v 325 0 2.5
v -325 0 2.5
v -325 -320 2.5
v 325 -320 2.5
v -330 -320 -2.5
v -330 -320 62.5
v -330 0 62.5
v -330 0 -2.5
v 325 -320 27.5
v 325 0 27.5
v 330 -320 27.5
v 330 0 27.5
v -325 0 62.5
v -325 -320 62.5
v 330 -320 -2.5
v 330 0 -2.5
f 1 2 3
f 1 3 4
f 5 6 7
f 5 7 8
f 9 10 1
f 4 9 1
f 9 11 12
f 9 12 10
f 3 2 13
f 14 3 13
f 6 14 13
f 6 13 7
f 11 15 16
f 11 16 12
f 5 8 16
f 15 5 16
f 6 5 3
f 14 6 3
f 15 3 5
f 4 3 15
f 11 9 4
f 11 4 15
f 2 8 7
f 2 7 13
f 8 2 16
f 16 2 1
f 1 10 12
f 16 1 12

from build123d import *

# Parameters (mm, degrees)
F0_W     = 650
F0_H     = 5
F1_DEPTH = 320


with BuildPart() as f1:
    # F0 (on Front) → F1 (new body)
    with BuildSketch(Plane.XZ):
        Rectangle(F0_W, F0_H)
        Polygon((325, 2.5), (325, -2.5), (330, -2.5), (330, 27.5), (325, 27.5), align=None)
        Polygon((-330, -2.5), (-325, -2.5), (-325, 2.5), (-325, 62.5), (-330, 62.5), align=None)
    extrude(amount=F1_DEPTH)


solid = f1.part
